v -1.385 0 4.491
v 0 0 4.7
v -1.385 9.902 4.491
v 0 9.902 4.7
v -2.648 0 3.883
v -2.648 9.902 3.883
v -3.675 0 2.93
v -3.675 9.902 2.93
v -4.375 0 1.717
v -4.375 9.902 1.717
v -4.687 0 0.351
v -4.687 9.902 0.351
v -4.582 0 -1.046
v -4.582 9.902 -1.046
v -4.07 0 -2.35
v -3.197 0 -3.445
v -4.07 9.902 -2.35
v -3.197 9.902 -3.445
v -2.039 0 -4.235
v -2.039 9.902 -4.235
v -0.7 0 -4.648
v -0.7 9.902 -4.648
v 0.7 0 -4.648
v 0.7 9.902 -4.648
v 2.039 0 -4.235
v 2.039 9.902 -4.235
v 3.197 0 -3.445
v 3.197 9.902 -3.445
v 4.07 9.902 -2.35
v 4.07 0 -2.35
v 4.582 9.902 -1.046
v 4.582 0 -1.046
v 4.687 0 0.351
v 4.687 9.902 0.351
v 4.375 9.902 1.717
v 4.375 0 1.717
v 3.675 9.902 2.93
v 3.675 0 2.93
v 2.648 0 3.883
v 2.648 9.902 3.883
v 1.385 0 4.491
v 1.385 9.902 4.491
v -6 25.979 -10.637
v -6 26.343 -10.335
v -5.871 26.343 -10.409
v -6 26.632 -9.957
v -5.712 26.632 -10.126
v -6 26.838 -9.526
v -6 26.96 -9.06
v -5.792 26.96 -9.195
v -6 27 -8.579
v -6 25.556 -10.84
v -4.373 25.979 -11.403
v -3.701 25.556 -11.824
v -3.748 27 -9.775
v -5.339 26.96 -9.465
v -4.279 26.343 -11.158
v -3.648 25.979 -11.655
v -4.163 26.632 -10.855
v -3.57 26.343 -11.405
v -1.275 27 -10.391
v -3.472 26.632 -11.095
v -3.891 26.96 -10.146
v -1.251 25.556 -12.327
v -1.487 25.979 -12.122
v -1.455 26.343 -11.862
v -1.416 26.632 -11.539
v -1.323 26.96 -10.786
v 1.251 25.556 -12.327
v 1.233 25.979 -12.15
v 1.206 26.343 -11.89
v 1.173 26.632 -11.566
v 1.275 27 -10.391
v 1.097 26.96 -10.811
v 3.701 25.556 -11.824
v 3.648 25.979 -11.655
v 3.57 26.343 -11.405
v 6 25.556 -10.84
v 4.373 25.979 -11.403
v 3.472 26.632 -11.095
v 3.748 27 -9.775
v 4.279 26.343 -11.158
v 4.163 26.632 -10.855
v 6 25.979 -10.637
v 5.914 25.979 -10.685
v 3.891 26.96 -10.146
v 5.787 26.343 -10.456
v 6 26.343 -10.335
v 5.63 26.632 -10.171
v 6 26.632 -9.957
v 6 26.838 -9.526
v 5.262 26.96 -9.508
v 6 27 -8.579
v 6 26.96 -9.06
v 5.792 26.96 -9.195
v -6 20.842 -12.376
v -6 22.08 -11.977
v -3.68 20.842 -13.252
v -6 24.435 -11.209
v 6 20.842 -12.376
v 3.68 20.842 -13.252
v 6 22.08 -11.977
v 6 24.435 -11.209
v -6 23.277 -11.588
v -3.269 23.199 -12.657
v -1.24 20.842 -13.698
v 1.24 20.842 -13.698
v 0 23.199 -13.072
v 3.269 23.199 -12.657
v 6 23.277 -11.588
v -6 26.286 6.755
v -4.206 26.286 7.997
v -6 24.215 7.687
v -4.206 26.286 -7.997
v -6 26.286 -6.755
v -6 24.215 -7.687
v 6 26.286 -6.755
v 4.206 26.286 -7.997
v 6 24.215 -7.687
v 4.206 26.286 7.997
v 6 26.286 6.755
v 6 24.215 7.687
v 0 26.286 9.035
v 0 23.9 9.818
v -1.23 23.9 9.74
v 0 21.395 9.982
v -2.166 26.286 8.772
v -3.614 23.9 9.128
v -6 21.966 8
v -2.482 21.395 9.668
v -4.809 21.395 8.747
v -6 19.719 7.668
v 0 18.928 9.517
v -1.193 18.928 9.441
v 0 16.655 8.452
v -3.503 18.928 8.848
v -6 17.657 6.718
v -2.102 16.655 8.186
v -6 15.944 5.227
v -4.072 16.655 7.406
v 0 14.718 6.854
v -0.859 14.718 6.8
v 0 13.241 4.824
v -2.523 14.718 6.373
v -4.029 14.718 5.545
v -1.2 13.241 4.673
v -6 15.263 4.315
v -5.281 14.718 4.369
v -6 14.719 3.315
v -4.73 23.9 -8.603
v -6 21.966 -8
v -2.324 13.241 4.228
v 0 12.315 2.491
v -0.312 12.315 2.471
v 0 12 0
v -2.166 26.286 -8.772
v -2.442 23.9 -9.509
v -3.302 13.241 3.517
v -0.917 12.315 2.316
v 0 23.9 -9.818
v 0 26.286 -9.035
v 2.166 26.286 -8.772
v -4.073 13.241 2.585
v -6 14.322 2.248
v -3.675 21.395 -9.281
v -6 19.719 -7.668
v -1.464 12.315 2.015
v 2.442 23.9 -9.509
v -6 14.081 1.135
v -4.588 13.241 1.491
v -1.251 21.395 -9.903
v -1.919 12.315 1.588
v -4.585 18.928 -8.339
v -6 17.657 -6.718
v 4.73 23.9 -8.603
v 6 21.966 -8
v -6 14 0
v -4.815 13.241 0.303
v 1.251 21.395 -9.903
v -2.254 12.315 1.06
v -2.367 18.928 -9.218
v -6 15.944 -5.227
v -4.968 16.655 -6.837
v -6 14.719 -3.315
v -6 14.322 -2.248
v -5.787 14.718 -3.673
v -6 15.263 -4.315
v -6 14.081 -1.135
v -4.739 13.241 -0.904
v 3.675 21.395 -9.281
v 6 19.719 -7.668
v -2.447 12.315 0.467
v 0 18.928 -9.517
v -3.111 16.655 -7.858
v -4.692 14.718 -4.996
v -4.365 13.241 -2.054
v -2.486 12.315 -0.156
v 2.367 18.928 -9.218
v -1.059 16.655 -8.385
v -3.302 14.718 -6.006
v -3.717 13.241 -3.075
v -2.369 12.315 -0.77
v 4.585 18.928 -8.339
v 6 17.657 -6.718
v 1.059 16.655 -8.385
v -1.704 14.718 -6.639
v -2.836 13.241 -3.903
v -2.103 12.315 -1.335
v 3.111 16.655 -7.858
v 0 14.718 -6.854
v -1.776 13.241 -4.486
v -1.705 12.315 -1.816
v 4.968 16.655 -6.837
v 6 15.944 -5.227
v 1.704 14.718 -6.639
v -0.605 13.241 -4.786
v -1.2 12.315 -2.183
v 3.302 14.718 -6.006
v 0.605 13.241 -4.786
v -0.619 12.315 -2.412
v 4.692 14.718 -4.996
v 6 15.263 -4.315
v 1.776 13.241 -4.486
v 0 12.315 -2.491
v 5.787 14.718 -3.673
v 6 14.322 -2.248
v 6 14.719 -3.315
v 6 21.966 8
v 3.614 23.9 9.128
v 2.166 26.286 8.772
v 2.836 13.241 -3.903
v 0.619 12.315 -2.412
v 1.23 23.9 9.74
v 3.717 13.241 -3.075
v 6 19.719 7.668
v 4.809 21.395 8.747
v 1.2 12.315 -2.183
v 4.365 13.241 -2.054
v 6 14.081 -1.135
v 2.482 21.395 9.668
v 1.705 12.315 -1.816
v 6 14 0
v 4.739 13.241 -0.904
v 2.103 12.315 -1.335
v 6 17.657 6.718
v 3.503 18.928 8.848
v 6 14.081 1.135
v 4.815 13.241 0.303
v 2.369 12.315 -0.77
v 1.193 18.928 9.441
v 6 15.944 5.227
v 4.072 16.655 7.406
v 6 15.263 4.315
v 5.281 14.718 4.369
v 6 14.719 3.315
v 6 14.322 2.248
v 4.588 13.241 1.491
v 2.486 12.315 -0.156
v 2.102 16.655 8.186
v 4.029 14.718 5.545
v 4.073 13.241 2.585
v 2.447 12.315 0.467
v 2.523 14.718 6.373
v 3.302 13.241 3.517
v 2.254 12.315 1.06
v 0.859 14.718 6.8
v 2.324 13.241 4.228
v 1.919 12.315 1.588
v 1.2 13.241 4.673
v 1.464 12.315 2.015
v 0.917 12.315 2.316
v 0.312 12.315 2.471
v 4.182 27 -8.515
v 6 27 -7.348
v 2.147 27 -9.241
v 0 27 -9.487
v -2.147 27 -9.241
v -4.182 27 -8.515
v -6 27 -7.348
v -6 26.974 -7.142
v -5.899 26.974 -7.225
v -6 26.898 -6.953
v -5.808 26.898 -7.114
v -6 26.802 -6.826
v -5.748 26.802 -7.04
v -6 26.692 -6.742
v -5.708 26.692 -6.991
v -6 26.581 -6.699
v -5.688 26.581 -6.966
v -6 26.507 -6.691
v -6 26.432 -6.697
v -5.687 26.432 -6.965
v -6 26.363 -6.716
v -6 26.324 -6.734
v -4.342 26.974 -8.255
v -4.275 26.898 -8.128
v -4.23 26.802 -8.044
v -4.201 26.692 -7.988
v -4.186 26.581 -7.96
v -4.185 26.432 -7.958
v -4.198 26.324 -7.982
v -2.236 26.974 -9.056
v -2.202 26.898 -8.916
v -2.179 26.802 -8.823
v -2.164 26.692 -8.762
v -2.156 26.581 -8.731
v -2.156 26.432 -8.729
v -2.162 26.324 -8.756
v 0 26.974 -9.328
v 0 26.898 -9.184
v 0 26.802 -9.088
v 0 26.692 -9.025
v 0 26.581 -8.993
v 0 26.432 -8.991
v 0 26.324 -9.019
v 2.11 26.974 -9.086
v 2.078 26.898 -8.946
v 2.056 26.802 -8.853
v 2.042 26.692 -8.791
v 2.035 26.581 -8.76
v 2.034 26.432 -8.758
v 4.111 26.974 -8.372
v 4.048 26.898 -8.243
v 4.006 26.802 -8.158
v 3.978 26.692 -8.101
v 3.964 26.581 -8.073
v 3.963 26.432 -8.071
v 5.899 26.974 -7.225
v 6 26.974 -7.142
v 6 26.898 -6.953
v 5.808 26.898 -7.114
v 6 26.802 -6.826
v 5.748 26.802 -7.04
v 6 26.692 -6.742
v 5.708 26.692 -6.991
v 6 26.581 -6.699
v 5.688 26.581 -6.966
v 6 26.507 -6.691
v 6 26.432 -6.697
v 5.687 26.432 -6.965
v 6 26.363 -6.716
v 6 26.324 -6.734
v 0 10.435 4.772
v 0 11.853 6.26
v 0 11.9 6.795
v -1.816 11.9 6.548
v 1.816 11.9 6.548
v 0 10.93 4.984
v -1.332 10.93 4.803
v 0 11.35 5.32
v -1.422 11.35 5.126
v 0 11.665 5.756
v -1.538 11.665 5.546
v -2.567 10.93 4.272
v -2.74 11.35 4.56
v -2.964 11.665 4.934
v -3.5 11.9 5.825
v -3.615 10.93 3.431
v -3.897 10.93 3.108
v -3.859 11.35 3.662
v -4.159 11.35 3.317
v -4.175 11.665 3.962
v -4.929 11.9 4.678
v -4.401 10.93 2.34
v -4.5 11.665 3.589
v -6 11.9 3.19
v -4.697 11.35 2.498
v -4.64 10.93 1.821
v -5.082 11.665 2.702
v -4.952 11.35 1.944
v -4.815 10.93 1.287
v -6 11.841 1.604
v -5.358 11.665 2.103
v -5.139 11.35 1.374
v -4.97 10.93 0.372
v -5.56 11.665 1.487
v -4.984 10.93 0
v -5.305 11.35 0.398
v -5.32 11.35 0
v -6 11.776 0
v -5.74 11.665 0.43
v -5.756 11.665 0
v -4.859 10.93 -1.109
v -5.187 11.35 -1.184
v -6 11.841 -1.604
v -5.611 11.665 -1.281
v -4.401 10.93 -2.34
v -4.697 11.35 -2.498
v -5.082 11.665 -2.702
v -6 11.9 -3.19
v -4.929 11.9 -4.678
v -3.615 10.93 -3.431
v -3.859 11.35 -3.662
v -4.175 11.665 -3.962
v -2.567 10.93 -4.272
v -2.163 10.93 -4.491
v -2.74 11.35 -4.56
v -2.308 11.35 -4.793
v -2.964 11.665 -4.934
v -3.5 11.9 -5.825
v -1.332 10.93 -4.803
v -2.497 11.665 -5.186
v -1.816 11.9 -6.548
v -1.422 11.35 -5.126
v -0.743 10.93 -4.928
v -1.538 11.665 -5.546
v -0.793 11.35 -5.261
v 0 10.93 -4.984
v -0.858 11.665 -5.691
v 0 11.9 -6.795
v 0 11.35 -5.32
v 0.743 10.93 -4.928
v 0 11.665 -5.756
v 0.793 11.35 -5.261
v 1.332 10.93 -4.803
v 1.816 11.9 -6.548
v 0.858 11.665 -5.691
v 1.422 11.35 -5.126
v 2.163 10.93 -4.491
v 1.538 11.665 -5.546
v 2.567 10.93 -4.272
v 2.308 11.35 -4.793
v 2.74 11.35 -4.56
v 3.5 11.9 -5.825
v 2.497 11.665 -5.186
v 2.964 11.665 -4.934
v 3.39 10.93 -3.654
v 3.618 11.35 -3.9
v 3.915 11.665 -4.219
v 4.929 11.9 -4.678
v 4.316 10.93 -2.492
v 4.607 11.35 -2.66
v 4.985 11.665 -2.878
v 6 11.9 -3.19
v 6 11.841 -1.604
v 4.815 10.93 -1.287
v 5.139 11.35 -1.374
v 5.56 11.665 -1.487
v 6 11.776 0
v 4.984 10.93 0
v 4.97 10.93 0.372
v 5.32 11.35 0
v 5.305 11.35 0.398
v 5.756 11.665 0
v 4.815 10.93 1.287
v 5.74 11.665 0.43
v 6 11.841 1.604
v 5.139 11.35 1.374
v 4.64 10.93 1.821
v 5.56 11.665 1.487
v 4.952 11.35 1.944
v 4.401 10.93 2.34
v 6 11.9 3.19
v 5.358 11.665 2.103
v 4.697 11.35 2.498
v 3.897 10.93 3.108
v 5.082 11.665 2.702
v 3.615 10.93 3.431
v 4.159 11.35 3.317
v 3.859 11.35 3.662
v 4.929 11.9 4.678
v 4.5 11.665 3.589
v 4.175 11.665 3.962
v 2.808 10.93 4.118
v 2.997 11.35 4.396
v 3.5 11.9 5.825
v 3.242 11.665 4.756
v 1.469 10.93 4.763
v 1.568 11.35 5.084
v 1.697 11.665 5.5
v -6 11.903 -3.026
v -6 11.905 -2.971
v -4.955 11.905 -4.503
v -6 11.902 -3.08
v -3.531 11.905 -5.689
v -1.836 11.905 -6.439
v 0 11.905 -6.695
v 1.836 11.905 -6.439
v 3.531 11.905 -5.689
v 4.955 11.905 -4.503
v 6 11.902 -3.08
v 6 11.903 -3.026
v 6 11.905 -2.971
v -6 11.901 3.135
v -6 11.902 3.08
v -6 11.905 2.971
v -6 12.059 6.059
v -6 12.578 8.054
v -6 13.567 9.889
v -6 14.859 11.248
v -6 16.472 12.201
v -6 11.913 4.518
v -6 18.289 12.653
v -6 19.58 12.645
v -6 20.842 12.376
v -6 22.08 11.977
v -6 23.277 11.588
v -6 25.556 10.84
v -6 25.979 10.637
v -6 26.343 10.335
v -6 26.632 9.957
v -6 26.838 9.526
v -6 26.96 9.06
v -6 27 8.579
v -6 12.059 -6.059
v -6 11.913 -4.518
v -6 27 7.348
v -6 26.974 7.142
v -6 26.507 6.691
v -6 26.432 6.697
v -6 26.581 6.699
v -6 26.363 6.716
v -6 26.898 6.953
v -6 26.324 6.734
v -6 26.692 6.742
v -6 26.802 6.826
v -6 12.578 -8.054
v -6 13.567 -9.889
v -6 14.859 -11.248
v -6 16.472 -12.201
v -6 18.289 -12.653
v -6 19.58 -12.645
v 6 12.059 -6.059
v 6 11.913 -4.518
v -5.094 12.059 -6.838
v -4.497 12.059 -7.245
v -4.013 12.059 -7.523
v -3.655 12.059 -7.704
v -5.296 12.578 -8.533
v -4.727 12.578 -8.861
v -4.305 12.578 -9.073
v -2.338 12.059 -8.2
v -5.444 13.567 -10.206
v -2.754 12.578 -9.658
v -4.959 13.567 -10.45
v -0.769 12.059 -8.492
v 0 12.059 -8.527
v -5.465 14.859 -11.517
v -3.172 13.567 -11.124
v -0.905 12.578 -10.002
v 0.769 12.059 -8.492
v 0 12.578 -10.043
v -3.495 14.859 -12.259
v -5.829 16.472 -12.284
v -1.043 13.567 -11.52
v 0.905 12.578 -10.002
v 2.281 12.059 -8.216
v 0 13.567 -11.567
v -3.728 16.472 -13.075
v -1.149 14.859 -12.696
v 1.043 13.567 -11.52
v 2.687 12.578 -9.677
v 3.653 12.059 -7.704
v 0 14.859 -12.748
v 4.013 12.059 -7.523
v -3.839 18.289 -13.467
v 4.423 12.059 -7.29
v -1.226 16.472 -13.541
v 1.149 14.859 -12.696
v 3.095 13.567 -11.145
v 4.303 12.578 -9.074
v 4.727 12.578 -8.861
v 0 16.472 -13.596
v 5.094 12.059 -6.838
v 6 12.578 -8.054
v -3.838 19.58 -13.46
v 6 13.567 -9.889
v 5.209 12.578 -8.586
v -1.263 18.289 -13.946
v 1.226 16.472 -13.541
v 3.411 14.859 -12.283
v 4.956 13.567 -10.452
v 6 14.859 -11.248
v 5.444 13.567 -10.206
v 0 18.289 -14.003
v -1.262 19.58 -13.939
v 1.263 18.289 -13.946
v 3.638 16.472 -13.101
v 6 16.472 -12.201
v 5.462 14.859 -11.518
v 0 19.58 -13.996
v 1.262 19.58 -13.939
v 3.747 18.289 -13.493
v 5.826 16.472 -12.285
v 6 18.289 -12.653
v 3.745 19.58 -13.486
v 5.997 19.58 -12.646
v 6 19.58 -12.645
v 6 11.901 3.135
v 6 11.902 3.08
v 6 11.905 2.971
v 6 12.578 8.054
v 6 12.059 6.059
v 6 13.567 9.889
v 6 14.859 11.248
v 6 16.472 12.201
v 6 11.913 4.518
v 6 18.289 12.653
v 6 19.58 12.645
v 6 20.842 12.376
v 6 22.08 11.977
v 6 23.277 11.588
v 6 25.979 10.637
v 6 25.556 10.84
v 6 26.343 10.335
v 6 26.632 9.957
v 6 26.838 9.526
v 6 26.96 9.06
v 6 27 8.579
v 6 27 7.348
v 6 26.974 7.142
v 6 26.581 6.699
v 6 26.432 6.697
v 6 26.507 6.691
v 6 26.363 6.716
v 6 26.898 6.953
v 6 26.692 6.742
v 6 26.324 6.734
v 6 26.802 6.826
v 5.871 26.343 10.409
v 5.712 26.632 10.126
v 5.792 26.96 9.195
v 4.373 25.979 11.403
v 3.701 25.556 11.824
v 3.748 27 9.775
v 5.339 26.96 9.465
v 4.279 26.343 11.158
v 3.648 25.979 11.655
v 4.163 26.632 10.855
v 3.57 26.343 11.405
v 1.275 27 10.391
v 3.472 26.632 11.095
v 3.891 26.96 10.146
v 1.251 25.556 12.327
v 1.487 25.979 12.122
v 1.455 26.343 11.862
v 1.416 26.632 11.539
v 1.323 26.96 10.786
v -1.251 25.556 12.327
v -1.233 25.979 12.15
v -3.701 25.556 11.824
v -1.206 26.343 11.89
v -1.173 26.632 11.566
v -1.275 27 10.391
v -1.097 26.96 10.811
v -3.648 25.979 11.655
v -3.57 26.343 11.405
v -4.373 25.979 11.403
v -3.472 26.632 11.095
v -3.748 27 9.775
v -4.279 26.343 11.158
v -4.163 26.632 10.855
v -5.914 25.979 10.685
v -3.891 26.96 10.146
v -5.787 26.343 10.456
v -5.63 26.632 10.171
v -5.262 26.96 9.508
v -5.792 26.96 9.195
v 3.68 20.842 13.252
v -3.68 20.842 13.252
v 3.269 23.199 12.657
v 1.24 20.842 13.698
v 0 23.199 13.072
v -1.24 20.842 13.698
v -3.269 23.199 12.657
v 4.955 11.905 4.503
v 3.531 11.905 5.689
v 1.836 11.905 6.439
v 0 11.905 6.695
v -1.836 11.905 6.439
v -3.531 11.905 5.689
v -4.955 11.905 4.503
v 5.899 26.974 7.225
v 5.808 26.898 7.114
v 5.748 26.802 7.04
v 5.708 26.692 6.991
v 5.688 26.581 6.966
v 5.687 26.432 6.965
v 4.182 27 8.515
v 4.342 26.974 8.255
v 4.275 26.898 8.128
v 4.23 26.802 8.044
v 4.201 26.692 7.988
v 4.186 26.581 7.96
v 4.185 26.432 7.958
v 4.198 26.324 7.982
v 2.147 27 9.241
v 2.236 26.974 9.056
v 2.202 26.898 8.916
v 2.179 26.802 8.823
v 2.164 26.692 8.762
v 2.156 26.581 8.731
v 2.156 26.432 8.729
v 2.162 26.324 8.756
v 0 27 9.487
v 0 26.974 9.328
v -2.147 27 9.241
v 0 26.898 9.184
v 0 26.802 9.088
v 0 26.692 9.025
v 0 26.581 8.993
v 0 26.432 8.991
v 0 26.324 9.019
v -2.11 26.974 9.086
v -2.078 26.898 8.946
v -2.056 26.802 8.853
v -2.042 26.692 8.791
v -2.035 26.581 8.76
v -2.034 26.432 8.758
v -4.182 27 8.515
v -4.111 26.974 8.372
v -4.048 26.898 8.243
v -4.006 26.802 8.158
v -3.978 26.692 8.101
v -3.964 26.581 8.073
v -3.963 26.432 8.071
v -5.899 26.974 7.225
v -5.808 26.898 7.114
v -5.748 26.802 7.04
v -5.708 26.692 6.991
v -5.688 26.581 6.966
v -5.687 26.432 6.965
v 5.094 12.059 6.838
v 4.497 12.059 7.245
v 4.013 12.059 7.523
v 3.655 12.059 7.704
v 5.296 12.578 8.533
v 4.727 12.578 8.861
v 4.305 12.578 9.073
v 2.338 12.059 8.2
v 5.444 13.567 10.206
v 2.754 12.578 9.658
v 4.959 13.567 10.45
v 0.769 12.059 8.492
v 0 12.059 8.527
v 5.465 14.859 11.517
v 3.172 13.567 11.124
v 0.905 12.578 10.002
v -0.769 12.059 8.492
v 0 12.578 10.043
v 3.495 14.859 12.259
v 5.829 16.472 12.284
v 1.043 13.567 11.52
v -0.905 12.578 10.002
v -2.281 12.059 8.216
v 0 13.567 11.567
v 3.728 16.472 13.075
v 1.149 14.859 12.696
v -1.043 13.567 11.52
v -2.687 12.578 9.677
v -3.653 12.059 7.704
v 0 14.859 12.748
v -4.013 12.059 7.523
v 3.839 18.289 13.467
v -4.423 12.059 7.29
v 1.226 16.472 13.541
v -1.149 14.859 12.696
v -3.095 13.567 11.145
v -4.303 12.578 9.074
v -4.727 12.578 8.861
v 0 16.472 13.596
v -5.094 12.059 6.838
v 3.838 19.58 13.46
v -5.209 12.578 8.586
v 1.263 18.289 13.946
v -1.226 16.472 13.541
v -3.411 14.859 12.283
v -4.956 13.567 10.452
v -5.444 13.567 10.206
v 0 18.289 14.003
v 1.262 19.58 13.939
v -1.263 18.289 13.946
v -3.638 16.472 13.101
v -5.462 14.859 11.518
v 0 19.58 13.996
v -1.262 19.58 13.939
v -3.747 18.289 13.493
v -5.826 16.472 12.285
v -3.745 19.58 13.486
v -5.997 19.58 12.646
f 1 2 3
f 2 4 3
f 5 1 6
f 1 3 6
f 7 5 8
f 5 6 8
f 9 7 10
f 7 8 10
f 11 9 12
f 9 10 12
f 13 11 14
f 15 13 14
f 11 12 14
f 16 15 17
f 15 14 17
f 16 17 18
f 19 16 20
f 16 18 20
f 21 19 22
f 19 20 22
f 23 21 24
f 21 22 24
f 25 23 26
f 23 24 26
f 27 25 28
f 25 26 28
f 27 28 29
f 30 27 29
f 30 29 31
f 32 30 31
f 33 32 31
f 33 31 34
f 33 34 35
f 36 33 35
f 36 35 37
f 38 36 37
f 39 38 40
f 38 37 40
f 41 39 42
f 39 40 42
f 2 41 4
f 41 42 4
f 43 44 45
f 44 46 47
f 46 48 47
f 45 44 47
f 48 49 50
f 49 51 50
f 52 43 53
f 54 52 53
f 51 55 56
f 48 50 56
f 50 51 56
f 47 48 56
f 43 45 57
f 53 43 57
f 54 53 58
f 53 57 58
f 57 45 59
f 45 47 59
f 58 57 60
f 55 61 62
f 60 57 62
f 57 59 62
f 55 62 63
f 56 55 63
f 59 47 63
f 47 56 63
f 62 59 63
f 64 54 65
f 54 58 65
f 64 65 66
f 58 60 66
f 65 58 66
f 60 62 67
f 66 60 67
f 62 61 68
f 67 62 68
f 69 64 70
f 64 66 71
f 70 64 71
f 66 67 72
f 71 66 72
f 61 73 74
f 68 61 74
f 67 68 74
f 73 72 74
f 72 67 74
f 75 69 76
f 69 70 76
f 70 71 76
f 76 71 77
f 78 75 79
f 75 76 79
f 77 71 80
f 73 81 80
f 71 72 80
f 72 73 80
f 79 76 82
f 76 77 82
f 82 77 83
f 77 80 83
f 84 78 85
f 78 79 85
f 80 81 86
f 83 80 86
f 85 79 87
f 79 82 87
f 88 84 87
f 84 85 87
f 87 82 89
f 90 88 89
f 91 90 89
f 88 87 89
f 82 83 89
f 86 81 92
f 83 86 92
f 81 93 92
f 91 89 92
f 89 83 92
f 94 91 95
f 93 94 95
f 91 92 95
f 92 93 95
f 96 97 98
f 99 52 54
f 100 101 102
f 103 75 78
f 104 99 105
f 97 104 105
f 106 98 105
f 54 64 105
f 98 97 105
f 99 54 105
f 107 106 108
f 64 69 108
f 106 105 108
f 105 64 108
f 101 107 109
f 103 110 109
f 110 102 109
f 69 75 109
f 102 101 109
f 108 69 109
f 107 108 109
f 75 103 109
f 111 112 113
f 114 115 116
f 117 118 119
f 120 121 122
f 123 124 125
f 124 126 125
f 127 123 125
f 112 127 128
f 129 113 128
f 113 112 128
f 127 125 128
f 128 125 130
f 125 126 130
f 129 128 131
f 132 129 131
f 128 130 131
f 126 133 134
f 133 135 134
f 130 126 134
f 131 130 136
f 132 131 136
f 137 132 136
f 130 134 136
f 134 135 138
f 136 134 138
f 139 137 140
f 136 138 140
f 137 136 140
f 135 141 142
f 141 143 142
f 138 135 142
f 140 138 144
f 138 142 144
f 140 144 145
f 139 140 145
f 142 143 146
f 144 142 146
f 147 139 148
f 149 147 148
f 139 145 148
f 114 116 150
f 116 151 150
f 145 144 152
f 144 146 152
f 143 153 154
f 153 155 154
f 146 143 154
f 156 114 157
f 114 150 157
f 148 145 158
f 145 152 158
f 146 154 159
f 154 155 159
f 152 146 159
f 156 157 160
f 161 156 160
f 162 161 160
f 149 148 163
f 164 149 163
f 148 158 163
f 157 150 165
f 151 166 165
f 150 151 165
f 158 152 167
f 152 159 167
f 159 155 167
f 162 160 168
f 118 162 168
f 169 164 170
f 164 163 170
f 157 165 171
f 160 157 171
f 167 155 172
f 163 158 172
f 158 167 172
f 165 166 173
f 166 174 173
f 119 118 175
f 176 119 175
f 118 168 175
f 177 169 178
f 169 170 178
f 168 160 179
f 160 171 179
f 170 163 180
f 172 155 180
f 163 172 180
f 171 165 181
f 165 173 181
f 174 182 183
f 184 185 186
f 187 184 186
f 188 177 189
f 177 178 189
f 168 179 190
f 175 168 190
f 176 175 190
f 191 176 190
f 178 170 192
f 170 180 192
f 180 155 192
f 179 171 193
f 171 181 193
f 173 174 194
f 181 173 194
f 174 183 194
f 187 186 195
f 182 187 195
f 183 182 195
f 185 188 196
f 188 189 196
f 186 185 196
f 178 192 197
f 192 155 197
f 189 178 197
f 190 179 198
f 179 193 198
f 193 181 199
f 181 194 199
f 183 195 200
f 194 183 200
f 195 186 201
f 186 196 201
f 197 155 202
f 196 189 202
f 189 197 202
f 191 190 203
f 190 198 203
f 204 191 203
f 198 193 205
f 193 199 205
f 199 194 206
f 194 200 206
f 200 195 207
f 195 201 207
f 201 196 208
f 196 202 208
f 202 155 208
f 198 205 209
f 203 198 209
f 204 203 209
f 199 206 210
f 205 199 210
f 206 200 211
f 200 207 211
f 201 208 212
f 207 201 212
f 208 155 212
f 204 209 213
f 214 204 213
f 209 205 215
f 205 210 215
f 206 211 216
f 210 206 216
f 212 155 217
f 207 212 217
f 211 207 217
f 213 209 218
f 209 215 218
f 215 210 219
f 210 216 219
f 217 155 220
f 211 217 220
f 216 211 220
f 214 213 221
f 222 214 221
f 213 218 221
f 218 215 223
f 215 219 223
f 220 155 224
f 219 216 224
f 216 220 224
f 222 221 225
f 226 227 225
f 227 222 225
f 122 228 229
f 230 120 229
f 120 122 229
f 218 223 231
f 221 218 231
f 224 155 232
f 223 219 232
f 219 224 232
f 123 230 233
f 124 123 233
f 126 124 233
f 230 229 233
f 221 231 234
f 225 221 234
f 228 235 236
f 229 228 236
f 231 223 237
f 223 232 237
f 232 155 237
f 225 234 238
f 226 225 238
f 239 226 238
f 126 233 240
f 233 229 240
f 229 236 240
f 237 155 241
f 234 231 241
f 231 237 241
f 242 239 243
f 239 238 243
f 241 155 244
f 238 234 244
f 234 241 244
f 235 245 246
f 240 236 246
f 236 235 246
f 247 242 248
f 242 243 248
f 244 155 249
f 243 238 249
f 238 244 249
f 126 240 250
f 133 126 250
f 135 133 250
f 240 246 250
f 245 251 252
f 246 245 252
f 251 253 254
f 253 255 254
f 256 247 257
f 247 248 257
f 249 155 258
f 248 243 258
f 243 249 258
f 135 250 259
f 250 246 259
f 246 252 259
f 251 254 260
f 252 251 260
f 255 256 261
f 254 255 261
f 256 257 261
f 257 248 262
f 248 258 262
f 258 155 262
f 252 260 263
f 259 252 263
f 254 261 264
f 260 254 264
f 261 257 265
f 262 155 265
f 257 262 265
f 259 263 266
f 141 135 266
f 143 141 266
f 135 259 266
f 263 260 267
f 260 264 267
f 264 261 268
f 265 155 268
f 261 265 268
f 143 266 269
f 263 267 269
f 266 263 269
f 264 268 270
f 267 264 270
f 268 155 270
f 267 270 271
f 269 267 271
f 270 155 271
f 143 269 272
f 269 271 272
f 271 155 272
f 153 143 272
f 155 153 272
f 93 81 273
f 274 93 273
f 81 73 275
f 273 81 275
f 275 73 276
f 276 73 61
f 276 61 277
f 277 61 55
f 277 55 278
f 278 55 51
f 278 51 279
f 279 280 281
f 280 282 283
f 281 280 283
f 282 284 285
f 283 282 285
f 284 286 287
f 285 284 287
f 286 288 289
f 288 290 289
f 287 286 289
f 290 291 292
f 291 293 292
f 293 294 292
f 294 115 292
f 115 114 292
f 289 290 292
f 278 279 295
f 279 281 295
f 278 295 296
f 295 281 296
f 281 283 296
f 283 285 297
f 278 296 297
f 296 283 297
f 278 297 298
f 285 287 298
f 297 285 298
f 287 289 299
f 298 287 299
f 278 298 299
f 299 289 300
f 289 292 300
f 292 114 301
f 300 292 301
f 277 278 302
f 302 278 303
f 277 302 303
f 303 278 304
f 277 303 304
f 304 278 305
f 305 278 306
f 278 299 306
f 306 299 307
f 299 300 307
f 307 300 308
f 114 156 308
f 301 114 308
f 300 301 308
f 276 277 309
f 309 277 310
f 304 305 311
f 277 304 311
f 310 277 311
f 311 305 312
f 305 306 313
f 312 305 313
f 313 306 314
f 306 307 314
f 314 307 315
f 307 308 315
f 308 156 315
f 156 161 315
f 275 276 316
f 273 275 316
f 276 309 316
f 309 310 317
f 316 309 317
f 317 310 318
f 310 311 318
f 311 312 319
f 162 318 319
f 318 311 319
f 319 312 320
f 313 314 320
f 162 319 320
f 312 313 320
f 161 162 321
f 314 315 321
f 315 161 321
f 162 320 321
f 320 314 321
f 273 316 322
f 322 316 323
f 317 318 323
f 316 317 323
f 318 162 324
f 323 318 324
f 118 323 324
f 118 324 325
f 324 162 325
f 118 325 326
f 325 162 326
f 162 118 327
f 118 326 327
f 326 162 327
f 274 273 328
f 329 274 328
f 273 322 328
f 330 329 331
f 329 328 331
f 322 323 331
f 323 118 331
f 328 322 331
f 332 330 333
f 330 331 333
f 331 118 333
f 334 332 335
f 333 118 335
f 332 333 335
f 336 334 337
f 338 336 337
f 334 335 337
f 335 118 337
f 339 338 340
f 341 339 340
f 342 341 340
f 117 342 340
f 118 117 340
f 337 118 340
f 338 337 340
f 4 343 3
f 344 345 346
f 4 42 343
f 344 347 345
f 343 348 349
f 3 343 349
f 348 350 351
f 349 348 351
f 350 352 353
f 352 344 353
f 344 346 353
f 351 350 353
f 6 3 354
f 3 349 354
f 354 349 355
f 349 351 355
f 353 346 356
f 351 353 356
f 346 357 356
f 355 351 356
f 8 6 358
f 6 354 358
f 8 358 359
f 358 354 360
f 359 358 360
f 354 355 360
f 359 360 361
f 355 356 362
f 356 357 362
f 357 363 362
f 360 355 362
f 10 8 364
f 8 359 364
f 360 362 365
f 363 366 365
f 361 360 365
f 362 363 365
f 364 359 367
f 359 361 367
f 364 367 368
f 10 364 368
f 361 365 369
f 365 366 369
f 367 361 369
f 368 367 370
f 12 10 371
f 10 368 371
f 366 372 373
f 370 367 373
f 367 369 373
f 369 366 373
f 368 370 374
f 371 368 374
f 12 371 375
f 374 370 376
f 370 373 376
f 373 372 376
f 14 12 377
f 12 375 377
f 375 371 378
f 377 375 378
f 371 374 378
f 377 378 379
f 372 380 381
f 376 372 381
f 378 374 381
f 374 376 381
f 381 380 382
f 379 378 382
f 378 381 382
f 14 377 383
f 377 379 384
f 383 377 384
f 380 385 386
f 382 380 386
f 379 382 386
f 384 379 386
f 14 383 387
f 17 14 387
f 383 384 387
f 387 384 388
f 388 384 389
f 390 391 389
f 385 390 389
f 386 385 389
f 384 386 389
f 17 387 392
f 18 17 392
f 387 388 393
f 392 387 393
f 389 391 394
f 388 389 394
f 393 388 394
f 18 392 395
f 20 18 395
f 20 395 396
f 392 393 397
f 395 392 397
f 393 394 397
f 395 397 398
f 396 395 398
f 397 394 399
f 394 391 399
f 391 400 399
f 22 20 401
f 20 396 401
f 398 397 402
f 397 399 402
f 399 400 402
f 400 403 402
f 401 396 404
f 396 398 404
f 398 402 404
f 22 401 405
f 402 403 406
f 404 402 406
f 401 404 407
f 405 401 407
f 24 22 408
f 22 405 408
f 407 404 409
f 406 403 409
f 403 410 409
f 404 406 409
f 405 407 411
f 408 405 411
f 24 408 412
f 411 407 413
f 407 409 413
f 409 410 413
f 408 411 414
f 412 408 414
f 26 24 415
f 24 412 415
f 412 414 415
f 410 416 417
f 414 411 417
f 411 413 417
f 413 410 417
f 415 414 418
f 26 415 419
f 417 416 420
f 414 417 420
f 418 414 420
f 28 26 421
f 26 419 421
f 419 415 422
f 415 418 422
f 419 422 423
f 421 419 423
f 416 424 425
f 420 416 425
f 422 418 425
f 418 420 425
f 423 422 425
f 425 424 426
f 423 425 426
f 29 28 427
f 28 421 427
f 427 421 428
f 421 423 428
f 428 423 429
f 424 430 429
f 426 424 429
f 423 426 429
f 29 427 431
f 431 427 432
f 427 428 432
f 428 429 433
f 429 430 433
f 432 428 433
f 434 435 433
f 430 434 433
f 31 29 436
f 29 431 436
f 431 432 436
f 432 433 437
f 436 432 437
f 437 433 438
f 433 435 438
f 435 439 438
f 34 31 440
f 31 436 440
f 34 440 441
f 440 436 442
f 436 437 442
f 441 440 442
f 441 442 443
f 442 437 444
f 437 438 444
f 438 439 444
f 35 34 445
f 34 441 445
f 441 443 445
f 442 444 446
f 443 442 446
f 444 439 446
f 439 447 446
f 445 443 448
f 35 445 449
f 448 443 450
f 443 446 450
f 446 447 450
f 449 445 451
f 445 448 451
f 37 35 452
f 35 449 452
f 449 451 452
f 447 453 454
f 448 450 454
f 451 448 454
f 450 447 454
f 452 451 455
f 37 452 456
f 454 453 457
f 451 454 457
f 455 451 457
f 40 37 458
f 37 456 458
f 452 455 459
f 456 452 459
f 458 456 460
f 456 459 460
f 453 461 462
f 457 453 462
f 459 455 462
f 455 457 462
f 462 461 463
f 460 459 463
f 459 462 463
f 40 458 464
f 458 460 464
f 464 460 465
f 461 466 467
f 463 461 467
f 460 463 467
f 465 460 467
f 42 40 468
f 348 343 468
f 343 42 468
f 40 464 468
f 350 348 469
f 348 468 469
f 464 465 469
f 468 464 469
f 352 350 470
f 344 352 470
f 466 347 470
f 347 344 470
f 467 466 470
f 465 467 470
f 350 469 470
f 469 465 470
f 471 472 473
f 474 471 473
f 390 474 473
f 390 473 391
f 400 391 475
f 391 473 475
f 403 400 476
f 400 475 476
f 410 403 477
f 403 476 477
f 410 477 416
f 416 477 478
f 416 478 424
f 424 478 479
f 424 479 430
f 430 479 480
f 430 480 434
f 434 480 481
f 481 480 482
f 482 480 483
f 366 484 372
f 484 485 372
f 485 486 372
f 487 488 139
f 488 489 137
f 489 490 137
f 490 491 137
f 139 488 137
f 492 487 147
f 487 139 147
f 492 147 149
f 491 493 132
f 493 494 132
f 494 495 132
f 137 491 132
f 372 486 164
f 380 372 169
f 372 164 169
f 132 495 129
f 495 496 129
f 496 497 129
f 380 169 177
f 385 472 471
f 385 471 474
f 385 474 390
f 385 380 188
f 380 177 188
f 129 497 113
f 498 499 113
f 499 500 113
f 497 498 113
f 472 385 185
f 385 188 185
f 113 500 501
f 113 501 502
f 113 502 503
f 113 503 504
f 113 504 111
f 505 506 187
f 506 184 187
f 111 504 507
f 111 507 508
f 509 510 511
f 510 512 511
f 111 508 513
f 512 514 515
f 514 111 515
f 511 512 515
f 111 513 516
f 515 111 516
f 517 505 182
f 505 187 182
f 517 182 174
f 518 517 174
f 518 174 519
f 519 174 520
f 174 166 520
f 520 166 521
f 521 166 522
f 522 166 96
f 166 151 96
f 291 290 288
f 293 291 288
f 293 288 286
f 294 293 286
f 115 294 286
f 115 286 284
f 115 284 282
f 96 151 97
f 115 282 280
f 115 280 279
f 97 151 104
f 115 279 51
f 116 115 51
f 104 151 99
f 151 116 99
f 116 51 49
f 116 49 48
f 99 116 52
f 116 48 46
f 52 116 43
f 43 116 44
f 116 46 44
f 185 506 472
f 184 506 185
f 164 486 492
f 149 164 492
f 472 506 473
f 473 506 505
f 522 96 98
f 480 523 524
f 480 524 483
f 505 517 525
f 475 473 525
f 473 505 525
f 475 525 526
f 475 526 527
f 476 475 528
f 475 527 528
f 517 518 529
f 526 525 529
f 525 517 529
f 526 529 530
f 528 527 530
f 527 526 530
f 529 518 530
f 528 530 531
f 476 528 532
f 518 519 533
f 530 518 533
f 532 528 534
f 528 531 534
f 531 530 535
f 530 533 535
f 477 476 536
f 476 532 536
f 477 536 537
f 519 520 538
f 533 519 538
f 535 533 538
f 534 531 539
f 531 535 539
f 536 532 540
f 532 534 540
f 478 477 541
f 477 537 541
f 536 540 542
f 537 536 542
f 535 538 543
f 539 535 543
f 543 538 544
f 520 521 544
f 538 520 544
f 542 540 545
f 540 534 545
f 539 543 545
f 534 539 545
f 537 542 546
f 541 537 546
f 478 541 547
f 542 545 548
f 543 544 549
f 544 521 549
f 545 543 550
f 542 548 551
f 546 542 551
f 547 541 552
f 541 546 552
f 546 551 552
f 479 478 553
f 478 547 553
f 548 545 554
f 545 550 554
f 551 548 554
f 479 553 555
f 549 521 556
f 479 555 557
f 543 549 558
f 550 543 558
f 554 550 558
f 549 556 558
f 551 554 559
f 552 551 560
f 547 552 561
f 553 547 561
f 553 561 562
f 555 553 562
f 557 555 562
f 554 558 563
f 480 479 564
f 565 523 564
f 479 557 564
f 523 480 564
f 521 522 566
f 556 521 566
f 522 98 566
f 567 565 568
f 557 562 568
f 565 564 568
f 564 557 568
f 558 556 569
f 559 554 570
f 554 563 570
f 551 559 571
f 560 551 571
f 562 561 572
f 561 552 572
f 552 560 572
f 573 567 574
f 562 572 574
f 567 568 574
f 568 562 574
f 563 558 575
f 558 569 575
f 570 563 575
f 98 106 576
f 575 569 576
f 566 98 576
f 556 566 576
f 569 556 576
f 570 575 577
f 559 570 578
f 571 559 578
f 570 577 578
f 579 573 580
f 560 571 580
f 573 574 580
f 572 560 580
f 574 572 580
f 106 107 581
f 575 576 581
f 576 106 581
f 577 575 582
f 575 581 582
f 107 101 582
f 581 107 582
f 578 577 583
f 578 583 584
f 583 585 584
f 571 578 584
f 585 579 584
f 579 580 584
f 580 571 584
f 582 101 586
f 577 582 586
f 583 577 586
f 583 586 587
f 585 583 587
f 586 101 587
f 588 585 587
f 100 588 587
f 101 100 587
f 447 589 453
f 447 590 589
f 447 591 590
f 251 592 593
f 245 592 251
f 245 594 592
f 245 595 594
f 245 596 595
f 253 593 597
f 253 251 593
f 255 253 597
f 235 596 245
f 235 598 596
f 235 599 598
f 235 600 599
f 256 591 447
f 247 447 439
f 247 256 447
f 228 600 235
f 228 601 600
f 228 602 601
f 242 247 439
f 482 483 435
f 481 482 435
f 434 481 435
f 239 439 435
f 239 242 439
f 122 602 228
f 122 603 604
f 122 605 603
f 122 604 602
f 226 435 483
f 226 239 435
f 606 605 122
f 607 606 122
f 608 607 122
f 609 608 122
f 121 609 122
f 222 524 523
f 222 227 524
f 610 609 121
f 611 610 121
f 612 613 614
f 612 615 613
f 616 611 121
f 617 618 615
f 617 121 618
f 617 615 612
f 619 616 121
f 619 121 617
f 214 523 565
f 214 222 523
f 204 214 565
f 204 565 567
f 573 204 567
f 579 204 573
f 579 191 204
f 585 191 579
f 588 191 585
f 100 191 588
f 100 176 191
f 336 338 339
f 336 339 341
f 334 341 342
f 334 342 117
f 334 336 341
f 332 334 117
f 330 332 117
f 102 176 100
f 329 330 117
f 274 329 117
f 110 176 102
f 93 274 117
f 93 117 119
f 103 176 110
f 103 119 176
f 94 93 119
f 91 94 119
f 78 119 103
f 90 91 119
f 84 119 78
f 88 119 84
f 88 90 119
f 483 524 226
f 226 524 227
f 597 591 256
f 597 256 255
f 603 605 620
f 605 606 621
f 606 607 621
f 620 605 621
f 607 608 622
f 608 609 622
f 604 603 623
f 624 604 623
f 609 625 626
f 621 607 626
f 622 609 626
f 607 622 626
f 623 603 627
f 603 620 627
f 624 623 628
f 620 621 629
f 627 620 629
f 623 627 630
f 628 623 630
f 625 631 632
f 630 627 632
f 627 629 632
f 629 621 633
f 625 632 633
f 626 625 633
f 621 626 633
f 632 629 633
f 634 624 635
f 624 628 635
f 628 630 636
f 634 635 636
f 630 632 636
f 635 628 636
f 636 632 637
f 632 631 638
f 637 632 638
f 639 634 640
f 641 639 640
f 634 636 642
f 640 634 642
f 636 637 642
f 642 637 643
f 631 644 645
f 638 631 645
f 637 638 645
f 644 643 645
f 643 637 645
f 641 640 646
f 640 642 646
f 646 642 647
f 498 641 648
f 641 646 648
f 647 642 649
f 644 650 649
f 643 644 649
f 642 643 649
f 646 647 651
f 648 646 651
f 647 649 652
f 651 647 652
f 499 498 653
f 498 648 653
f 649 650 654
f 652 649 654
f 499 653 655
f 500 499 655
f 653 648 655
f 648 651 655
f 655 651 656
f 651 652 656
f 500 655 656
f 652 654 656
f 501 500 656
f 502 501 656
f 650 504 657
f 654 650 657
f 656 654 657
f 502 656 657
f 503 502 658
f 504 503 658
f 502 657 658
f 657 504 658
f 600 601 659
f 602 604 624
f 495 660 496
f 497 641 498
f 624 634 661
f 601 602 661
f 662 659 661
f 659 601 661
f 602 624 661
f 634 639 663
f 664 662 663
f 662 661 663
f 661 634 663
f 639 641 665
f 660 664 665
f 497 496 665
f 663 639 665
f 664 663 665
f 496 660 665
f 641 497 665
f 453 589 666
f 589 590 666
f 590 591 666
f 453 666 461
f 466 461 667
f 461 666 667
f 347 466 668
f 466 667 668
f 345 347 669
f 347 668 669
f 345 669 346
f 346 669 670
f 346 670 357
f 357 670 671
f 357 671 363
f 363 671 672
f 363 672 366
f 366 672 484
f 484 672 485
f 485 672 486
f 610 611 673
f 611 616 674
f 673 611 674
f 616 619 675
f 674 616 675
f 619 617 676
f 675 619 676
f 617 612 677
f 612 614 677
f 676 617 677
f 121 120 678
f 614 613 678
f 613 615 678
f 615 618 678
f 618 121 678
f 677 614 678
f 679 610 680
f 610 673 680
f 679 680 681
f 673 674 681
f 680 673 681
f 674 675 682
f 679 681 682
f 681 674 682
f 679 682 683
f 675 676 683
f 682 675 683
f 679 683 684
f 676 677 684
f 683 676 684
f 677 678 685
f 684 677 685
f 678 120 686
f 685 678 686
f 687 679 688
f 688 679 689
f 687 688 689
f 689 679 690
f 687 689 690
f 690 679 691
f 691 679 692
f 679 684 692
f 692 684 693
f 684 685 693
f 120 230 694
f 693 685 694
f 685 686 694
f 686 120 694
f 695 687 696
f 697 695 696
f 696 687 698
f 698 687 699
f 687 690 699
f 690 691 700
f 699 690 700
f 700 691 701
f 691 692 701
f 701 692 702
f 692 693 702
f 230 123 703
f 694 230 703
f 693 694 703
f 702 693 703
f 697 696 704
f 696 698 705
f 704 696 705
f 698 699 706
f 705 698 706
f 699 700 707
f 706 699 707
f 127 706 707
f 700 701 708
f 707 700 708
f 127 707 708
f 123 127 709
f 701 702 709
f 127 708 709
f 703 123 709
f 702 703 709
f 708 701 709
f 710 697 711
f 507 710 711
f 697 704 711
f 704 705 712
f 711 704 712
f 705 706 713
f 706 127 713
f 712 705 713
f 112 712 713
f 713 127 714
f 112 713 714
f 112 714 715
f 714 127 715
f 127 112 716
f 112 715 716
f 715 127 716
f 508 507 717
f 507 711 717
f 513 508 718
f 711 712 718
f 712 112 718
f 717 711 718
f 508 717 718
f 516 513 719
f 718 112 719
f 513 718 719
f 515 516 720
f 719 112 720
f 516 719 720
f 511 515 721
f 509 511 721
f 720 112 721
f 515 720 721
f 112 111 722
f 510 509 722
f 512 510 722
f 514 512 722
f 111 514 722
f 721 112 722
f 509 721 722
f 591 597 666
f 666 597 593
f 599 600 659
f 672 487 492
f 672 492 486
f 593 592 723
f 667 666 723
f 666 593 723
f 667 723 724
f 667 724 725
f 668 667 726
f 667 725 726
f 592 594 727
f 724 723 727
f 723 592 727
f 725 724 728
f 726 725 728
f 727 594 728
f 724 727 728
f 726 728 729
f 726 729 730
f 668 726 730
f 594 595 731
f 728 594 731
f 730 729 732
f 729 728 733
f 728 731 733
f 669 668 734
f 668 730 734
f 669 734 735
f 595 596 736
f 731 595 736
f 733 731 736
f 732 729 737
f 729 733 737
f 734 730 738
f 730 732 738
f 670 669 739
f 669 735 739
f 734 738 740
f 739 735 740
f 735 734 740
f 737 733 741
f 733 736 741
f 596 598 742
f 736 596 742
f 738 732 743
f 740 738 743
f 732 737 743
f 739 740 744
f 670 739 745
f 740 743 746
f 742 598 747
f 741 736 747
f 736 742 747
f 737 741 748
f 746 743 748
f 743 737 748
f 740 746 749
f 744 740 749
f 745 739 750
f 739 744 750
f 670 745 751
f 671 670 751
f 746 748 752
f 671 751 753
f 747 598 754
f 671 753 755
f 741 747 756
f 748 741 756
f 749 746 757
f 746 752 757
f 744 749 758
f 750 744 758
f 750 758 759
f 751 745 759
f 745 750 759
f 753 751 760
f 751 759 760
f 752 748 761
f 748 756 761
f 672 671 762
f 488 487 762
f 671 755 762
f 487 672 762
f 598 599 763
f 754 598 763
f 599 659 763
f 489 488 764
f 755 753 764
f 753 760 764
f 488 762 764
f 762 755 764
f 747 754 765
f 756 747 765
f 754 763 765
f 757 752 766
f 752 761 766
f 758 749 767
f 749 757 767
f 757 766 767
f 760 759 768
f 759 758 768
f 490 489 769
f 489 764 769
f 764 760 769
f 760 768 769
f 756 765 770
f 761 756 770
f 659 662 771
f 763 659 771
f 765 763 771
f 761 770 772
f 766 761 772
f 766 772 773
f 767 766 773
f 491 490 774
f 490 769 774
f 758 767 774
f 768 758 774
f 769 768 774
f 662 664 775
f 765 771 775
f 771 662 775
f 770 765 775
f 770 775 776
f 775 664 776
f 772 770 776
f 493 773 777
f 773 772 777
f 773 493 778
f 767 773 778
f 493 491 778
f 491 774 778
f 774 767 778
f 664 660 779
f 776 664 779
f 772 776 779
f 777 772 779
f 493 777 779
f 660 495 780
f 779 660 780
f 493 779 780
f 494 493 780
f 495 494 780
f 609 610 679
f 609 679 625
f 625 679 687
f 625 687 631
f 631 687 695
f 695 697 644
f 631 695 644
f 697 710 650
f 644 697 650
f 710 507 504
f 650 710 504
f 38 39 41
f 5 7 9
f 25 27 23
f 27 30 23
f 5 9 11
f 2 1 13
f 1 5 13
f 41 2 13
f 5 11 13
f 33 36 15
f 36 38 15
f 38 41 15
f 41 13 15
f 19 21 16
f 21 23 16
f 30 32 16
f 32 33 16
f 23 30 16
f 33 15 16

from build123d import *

# Parameters (mm, degrees)
CROQUIS3_W            = 12.155845656
CROQUIS3_H            = 36.65917603
CORTAR_EXTRUIR1_DEPTH = 21


with BuildPart() as part:
    # Croquis2 → Revolución1 (revolve)
    with BuildSketch(Plane(origin=(0, 0, 0), x_dir=(0, 0, -1), z_dir=(1, 0, 0))):
        with BuildLine():
            Line((0, 0), (-4.7, 0))
            Line((-4.7, 0), (-4.7, 9.902147454))
            ThreePointArc((-4.7, 9.902147454), (-5.319949818, 11.349718348), (-6.795461494, 11.899867931))
            Line((-6.795461494, 11.899867931), (-6.695457392, 11.904646648))
            ThreePointArc((-6.695457392, 11.904646648), (-12.523047033, 14.558265513), (-13.753776425, 20.842197345))
            Line((-13.753776425, 20.842197345), (-12.389960221, 25.555865437))
            ThreePointArc((-12.389960221, 25.555865437), (-11.670480634, 26.598707427), (-10.468759134, 27))
            Line((-10.468759134, 27), (-9.486832981, 27))
            ThreePointArc((-9.486832981, 27), (-9.064255853, 26.767261242), (-9.035079029, 26.285714286))
            ThreePointArc((-9.035079029, 26.285714286), (-8.451542547, 16.654775162), (0, 12))
            Line((0, 12), (0, 0))
        make_face()
    revolve(axis=Axis((0, 22, 0), (0, -1, 0)))

    # Croquis3 → Cortar-Extruir1 (cut)
    with BuildSketch(Plane(origin=(0, 30, 0), x_dir=(1, 0, 0), z_dir=(0, 1, 0))):
        with Locations((-12.077922828, -0.329588015)):
            Rectangle(CROQUIS3_W, CROQUIS3_H)
        with Locations((12.077922828, -0.329588015)):
            Rectangle(CROQUIS3_W, CROQUIS3_H)
    extrude(amount=-CORTAR_EXTRUIR1_DEPTH, mode=Mode.SUBTRACT)


solid = part.part
